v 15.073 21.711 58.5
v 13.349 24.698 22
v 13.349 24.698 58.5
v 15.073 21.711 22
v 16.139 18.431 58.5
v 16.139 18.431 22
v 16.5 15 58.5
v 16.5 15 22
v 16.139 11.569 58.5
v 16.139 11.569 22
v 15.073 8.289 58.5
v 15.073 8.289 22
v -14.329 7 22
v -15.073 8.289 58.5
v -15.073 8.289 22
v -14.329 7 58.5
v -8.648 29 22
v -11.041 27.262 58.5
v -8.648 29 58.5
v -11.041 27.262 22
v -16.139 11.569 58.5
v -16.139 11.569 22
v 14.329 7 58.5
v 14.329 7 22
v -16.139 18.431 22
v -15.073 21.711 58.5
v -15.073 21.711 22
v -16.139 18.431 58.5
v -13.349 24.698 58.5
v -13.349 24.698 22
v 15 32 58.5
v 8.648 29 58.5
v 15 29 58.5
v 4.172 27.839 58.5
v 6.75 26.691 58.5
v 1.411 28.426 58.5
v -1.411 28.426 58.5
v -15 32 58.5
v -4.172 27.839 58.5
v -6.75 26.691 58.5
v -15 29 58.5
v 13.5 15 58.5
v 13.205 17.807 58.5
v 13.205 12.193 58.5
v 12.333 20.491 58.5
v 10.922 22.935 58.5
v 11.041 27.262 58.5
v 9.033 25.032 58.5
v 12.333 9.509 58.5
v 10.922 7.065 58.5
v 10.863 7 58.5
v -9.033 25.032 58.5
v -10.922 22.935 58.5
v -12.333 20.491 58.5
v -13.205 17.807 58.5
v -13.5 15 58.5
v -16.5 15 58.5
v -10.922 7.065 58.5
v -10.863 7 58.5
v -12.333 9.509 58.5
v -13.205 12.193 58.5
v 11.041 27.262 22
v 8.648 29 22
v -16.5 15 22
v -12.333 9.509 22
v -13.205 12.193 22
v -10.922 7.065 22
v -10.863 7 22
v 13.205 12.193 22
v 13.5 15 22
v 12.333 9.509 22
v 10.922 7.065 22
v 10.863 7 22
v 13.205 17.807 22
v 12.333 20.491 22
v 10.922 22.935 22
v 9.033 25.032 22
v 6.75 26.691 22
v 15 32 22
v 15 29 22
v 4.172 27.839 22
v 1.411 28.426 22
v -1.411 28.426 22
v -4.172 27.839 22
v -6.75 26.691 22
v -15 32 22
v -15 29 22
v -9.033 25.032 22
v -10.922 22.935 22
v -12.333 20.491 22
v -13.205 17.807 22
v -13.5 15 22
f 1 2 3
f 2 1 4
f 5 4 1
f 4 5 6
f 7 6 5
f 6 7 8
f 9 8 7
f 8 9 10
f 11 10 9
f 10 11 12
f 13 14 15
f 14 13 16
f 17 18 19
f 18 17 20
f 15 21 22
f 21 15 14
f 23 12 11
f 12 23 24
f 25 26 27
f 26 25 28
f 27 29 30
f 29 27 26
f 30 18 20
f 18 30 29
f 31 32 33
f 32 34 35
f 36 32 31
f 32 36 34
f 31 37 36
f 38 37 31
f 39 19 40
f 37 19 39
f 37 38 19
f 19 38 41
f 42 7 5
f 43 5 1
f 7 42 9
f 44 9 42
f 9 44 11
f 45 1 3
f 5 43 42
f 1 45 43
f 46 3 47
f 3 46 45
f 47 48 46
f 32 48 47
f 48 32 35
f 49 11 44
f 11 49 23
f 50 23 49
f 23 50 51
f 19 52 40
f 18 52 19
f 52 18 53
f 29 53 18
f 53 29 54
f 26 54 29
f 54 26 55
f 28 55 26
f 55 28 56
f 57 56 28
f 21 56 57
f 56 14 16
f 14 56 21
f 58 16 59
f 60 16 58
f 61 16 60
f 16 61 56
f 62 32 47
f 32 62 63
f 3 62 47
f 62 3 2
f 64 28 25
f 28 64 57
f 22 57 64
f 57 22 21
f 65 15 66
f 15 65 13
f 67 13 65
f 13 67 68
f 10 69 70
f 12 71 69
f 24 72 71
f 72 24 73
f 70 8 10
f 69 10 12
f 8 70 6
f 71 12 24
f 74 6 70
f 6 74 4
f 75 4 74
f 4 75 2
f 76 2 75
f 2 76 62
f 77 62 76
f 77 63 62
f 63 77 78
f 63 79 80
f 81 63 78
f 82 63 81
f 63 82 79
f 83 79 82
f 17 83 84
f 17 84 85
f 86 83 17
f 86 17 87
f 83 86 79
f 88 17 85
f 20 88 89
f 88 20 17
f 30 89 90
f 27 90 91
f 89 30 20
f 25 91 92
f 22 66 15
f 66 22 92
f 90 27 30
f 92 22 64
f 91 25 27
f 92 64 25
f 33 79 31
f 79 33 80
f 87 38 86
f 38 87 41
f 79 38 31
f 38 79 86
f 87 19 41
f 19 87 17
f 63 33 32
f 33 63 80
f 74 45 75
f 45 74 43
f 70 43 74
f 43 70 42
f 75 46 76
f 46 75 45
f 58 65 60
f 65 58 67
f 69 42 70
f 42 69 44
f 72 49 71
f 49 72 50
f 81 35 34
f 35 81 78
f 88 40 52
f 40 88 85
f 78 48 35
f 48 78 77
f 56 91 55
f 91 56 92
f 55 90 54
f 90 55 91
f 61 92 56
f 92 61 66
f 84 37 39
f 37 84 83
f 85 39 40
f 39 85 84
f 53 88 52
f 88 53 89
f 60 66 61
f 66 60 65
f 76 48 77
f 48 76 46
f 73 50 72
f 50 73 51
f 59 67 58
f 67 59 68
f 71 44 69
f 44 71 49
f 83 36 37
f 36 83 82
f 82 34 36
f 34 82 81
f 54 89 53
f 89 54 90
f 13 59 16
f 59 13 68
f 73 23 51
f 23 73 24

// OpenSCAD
module clamp(length,diameter) {
	xlate=36.5-length;
	radius=diameter/2;
	translate([xlate,15,22]) {
  
			difference(){
				union() {
					cylinder(h=length,r=radius+3,center=false);
					translate([-15,14,0]){
						cube([30,3,length]);
					}
				}

				cylinder(h=length,r=radius);
				translate([-20,-38,0]){
					cube([40,30,length]);
				}
			}

	
		
	}
}

clamp(36.5,27);
